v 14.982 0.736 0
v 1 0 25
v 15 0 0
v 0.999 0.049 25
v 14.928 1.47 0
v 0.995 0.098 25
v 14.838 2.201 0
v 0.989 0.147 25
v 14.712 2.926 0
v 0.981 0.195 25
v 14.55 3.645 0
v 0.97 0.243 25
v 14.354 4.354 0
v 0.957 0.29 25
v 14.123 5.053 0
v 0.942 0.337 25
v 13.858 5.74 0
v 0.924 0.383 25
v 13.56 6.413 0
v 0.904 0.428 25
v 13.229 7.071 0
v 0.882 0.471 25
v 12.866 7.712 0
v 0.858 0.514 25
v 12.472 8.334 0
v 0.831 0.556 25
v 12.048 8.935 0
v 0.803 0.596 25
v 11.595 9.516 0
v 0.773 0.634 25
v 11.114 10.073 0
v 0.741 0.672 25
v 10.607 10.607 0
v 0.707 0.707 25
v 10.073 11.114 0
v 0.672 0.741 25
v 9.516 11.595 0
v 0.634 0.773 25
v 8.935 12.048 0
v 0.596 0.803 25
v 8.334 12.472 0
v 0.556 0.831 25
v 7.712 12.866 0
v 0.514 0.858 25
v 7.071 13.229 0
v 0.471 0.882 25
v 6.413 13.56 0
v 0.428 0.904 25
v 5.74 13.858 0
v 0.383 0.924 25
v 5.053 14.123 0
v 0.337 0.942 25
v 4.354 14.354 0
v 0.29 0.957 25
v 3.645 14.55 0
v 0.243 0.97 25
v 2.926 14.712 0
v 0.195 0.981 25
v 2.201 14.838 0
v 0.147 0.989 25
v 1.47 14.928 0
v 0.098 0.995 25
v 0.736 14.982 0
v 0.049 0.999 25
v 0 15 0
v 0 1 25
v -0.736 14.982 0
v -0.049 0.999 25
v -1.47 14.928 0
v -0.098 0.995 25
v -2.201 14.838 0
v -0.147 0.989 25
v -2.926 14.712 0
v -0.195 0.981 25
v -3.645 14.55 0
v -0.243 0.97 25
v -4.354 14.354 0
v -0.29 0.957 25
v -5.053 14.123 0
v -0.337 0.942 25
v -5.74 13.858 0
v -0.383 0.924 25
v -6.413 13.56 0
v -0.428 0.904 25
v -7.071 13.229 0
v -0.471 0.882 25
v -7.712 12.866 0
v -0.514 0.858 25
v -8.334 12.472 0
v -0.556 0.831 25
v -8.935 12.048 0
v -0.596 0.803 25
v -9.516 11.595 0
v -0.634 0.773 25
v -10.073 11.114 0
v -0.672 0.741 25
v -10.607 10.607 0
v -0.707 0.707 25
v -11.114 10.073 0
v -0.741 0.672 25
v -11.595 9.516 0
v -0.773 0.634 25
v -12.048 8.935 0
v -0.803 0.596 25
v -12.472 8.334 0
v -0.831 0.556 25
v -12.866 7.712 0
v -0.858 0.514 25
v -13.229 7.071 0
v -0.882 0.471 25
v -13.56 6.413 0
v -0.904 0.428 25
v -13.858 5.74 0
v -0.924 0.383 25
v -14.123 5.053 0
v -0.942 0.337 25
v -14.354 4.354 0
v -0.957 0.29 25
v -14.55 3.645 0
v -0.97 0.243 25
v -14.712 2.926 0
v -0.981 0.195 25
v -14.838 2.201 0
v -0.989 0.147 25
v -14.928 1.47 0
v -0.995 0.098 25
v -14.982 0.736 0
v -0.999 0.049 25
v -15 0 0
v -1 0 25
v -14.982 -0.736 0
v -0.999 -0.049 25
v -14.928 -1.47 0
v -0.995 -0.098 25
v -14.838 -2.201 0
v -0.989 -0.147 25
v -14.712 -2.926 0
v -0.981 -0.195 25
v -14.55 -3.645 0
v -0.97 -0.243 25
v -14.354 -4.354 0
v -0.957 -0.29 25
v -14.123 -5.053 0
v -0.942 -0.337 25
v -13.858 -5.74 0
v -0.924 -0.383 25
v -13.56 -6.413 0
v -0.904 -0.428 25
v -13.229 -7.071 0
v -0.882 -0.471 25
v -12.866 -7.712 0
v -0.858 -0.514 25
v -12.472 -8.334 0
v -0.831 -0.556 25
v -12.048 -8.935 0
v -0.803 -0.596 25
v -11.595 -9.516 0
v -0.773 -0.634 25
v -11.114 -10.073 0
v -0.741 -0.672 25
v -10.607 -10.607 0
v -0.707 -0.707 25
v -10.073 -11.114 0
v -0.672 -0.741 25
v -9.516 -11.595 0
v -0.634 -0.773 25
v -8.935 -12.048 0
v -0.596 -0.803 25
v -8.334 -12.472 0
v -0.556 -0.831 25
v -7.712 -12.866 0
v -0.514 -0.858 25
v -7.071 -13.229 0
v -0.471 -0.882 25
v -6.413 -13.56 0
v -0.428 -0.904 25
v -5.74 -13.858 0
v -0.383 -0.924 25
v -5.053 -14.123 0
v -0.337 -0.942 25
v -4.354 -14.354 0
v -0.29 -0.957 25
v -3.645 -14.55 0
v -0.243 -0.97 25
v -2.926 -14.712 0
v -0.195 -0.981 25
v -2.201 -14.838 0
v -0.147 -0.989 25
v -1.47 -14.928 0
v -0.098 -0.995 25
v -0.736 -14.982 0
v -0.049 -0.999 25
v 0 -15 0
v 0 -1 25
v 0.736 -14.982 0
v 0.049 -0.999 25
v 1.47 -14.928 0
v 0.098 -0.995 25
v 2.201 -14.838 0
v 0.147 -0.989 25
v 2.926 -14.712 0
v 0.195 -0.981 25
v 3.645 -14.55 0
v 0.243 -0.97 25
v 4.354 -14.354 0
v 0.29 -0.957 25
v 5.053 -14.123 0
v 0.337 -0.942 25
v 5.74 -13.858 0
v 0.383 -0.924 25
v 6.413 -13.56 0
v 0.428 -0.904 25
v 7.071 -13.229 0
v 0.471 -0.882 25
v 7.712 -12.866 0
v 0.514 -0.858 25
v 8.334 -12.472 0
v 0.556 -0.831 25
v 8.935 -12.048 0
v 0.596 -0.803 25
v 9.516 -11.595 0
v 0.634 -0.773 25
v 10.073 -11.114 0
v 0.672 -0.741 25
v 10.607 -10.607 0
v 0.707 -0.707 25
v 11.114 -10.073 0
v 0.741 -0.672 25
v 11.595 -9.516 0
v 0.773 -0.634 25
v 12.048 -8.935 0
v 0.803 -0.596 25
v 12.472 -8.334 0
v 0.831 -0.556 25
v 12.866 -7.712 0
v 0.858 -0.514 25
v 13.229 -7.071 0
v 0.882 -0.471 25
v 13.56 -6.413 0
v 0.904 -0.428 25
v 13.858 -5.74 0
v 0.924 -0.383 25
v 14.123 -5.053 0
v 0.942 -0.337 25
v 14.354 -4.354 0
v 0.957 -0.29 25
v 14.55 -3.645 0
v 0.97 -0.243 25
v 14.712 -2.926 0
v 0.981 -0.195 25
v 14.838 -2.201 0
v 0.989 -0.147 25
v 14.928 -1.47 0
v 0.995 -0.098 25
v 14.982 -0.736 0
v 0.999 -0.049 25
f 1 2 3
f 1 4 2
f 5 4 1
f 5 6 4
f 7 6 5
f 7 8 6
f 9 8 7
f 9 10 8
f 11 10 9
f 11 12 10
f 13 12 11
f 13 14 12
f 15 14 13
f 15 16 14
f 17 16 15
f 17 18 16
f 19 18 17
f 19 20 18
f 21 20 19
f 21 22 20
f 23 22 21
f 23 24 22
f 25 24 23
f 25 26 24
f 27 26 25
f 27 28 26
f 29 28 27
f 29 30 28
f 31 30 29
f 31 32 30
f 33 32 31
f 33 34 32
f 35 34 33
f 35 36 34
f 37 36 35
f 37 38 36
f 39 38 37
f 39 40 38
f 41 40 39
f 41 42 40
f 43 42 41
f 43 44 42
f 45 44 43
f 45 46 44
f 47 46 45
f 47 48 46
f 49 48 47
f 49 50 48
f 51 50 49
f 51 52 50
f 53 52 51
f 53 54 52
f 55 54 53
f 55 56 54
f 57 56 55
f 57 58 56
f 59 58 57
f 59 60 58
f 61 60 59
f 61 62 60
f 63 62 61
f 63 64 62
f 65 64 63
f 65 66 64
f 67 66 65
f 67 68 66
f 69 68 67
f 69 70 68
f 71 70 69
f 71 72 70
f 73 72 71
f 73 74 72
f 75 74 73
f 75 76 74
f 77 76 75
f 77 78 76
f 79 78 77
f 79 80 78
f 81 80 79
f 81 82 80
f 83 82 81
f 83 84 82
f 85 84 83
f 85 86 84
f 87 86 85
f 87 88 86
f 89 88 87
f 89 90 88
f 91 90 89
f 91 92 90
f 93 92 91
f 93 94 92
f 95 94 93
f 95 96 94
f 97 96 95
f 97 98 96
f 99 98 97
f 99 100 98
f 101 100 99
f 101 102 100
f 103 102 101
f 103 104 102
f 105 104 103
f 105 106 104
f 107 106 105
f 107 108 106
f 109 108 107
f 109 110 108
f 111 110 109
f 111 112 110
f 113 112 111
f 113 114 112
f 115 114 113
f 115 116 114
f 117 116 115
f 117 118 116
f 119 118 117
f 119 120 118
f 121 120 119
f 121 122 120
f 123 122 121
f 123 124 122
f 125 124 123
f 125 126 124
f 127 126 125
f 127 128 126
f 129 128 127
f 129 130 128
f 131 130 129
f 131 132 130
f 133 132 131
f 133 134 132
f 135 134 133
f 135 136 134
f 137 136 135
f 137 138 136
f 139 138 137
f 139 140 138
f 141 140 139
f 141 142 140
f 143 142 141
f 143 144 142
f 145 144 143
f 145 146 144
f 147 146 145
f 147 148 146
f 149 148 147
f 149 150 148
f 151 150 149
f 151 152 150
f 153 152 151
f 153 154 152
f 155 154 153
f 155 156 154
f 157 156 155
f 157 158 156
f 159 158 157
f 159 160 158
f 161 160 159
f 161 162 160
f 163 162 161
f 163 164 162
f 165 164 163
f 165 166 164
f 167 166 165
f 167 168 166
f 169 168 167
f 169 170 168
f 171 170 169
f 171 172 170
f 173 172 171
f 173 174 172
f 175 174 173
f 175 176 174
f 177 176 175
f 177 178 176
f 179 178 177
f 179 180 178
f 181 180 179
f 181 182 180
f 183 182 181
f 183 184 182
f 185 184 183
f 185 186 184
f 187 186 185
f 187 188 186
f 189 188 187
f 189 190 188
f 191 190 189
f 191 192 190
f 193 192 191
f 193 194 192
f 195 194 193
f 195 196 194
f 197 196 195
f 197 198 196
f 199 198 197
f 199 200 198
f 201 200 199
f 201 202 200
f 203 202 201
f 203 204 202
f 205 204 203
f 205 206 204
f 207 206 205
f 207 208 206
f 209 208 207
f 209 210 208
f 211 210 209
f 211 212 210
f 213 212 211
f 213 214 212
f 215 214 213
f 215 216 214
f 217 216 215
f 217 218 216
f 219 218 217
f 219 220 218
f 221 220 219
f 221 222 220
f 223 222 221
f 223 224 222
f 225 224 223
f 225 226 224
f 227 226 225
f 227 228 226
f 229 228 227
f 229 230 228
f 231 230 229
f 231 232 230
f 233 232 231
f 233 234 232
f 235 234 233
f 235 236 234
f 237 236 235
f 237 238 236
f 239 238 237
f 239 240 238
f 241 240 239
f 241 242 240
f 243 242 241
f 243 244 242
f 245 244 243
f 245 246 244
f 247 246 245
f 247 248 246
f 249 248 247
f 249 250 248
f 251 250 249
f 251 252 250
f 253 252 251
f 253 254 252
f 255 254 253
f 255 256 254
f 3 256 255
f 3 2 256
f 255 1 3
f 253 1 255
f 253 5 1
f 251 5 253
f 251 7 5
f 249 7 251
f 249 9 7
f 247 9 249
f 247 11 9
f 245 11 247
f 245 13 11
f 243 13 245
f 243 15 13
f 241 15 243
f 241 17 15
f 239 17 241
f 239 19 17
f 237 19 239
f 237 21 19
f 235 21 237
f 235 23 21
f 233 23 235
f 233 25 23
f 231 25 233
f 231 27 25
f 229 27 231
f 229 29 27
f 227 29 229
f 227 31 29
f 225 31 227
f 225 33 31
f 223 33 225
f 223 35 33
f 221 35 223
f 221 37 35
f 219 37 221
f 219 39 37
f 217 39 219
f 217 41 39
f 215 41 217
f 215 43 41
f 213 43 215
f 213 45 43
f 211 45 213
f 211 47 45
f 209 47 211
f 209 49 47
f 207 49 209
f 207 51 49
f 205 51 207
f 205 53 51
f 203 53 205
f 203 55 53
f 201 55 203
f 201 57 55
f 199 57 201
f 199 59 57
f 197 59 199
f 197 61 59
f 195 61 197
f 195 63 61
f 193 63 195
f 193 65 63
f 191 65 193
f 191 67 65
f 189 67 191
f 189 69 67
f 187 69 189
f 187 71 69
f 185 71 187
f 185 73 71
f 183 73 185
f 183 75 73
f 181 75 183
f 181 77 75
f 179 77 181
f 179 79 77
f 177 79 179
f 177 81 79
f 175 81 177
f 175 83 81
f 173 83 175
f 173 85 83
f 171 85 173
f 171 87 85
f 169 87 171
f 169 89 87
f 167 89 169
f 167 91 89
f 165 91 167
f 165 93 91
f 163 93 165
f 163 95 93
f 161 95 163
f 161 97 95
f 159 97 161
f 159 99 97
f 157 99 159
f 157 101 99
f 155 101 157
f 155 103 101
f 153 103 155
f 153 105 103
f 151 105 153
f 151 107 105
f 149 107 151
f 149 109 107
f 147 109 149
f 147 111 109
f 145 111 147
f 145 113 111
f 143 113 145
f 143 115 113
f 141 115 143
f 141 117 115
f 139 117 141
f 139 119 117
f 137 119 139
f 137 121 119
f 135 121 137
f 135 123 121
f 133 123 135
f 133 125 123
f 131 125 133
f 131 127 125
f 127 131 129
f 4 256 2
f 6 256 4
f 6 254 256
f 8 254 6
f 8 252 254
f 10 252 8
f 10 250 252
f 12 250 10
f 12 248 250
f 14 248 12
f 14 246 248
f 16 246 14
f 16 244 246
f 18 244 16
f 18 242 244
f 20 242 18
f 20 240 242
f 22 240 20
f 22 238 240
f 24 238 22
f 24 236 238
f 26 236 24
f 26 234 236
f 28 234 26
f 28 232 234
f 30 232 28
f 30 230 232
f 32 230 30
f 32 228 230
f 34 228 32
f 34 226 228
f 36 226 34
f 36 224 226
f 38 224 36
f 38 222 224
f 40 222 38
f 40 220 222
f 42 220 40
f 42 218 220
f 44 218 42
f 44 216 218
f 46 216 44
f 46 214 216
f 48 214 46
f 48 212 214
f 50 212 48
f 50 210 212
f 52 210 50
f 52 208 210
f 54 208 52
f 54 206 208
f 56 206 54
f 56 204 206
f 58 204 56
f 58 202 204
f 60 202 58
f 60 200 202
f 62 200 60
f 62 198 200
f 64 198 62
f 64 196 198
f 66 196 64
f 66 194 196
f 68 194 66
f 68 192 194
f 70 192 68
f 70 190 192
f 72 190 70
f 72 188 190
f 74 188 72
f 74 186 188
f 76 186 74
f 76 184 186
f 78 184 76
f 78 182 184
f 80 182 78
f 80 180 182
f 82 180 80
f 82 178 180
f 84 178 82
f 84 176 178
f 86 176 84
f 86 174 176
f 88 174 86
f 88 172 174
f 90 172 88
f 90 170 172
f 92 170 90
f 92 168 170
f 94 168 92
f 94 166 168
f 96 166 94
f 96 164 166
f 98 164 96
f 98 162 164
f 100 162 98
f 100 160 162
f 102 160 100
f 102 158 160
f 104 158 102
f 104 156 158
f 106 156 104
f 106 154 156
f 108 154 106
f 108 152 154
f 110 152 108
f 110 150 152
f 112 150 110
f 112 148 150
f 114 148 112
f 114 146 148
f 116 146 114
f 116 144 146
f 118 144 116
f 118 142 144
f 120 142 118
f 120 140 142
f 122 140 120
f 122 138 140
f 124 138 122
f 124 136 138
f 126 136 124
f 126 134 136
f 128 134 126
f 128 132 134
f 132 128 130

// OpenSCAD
// Auto-generated from tests/data/feature_fixtures_manifest.json
// fixture: cone_steep
// fixture_type: cone
// description: Steep cone frustum (r1=15, r2=1, h=25); negative-class guard against cylinder over-detection.
$fn = 96;

radius1 = 15.000000;
radius2 = 1.000000;
height = 25.000000;

cylinder(r1=radius1, r2=radius2, h=height, $fn=128);
